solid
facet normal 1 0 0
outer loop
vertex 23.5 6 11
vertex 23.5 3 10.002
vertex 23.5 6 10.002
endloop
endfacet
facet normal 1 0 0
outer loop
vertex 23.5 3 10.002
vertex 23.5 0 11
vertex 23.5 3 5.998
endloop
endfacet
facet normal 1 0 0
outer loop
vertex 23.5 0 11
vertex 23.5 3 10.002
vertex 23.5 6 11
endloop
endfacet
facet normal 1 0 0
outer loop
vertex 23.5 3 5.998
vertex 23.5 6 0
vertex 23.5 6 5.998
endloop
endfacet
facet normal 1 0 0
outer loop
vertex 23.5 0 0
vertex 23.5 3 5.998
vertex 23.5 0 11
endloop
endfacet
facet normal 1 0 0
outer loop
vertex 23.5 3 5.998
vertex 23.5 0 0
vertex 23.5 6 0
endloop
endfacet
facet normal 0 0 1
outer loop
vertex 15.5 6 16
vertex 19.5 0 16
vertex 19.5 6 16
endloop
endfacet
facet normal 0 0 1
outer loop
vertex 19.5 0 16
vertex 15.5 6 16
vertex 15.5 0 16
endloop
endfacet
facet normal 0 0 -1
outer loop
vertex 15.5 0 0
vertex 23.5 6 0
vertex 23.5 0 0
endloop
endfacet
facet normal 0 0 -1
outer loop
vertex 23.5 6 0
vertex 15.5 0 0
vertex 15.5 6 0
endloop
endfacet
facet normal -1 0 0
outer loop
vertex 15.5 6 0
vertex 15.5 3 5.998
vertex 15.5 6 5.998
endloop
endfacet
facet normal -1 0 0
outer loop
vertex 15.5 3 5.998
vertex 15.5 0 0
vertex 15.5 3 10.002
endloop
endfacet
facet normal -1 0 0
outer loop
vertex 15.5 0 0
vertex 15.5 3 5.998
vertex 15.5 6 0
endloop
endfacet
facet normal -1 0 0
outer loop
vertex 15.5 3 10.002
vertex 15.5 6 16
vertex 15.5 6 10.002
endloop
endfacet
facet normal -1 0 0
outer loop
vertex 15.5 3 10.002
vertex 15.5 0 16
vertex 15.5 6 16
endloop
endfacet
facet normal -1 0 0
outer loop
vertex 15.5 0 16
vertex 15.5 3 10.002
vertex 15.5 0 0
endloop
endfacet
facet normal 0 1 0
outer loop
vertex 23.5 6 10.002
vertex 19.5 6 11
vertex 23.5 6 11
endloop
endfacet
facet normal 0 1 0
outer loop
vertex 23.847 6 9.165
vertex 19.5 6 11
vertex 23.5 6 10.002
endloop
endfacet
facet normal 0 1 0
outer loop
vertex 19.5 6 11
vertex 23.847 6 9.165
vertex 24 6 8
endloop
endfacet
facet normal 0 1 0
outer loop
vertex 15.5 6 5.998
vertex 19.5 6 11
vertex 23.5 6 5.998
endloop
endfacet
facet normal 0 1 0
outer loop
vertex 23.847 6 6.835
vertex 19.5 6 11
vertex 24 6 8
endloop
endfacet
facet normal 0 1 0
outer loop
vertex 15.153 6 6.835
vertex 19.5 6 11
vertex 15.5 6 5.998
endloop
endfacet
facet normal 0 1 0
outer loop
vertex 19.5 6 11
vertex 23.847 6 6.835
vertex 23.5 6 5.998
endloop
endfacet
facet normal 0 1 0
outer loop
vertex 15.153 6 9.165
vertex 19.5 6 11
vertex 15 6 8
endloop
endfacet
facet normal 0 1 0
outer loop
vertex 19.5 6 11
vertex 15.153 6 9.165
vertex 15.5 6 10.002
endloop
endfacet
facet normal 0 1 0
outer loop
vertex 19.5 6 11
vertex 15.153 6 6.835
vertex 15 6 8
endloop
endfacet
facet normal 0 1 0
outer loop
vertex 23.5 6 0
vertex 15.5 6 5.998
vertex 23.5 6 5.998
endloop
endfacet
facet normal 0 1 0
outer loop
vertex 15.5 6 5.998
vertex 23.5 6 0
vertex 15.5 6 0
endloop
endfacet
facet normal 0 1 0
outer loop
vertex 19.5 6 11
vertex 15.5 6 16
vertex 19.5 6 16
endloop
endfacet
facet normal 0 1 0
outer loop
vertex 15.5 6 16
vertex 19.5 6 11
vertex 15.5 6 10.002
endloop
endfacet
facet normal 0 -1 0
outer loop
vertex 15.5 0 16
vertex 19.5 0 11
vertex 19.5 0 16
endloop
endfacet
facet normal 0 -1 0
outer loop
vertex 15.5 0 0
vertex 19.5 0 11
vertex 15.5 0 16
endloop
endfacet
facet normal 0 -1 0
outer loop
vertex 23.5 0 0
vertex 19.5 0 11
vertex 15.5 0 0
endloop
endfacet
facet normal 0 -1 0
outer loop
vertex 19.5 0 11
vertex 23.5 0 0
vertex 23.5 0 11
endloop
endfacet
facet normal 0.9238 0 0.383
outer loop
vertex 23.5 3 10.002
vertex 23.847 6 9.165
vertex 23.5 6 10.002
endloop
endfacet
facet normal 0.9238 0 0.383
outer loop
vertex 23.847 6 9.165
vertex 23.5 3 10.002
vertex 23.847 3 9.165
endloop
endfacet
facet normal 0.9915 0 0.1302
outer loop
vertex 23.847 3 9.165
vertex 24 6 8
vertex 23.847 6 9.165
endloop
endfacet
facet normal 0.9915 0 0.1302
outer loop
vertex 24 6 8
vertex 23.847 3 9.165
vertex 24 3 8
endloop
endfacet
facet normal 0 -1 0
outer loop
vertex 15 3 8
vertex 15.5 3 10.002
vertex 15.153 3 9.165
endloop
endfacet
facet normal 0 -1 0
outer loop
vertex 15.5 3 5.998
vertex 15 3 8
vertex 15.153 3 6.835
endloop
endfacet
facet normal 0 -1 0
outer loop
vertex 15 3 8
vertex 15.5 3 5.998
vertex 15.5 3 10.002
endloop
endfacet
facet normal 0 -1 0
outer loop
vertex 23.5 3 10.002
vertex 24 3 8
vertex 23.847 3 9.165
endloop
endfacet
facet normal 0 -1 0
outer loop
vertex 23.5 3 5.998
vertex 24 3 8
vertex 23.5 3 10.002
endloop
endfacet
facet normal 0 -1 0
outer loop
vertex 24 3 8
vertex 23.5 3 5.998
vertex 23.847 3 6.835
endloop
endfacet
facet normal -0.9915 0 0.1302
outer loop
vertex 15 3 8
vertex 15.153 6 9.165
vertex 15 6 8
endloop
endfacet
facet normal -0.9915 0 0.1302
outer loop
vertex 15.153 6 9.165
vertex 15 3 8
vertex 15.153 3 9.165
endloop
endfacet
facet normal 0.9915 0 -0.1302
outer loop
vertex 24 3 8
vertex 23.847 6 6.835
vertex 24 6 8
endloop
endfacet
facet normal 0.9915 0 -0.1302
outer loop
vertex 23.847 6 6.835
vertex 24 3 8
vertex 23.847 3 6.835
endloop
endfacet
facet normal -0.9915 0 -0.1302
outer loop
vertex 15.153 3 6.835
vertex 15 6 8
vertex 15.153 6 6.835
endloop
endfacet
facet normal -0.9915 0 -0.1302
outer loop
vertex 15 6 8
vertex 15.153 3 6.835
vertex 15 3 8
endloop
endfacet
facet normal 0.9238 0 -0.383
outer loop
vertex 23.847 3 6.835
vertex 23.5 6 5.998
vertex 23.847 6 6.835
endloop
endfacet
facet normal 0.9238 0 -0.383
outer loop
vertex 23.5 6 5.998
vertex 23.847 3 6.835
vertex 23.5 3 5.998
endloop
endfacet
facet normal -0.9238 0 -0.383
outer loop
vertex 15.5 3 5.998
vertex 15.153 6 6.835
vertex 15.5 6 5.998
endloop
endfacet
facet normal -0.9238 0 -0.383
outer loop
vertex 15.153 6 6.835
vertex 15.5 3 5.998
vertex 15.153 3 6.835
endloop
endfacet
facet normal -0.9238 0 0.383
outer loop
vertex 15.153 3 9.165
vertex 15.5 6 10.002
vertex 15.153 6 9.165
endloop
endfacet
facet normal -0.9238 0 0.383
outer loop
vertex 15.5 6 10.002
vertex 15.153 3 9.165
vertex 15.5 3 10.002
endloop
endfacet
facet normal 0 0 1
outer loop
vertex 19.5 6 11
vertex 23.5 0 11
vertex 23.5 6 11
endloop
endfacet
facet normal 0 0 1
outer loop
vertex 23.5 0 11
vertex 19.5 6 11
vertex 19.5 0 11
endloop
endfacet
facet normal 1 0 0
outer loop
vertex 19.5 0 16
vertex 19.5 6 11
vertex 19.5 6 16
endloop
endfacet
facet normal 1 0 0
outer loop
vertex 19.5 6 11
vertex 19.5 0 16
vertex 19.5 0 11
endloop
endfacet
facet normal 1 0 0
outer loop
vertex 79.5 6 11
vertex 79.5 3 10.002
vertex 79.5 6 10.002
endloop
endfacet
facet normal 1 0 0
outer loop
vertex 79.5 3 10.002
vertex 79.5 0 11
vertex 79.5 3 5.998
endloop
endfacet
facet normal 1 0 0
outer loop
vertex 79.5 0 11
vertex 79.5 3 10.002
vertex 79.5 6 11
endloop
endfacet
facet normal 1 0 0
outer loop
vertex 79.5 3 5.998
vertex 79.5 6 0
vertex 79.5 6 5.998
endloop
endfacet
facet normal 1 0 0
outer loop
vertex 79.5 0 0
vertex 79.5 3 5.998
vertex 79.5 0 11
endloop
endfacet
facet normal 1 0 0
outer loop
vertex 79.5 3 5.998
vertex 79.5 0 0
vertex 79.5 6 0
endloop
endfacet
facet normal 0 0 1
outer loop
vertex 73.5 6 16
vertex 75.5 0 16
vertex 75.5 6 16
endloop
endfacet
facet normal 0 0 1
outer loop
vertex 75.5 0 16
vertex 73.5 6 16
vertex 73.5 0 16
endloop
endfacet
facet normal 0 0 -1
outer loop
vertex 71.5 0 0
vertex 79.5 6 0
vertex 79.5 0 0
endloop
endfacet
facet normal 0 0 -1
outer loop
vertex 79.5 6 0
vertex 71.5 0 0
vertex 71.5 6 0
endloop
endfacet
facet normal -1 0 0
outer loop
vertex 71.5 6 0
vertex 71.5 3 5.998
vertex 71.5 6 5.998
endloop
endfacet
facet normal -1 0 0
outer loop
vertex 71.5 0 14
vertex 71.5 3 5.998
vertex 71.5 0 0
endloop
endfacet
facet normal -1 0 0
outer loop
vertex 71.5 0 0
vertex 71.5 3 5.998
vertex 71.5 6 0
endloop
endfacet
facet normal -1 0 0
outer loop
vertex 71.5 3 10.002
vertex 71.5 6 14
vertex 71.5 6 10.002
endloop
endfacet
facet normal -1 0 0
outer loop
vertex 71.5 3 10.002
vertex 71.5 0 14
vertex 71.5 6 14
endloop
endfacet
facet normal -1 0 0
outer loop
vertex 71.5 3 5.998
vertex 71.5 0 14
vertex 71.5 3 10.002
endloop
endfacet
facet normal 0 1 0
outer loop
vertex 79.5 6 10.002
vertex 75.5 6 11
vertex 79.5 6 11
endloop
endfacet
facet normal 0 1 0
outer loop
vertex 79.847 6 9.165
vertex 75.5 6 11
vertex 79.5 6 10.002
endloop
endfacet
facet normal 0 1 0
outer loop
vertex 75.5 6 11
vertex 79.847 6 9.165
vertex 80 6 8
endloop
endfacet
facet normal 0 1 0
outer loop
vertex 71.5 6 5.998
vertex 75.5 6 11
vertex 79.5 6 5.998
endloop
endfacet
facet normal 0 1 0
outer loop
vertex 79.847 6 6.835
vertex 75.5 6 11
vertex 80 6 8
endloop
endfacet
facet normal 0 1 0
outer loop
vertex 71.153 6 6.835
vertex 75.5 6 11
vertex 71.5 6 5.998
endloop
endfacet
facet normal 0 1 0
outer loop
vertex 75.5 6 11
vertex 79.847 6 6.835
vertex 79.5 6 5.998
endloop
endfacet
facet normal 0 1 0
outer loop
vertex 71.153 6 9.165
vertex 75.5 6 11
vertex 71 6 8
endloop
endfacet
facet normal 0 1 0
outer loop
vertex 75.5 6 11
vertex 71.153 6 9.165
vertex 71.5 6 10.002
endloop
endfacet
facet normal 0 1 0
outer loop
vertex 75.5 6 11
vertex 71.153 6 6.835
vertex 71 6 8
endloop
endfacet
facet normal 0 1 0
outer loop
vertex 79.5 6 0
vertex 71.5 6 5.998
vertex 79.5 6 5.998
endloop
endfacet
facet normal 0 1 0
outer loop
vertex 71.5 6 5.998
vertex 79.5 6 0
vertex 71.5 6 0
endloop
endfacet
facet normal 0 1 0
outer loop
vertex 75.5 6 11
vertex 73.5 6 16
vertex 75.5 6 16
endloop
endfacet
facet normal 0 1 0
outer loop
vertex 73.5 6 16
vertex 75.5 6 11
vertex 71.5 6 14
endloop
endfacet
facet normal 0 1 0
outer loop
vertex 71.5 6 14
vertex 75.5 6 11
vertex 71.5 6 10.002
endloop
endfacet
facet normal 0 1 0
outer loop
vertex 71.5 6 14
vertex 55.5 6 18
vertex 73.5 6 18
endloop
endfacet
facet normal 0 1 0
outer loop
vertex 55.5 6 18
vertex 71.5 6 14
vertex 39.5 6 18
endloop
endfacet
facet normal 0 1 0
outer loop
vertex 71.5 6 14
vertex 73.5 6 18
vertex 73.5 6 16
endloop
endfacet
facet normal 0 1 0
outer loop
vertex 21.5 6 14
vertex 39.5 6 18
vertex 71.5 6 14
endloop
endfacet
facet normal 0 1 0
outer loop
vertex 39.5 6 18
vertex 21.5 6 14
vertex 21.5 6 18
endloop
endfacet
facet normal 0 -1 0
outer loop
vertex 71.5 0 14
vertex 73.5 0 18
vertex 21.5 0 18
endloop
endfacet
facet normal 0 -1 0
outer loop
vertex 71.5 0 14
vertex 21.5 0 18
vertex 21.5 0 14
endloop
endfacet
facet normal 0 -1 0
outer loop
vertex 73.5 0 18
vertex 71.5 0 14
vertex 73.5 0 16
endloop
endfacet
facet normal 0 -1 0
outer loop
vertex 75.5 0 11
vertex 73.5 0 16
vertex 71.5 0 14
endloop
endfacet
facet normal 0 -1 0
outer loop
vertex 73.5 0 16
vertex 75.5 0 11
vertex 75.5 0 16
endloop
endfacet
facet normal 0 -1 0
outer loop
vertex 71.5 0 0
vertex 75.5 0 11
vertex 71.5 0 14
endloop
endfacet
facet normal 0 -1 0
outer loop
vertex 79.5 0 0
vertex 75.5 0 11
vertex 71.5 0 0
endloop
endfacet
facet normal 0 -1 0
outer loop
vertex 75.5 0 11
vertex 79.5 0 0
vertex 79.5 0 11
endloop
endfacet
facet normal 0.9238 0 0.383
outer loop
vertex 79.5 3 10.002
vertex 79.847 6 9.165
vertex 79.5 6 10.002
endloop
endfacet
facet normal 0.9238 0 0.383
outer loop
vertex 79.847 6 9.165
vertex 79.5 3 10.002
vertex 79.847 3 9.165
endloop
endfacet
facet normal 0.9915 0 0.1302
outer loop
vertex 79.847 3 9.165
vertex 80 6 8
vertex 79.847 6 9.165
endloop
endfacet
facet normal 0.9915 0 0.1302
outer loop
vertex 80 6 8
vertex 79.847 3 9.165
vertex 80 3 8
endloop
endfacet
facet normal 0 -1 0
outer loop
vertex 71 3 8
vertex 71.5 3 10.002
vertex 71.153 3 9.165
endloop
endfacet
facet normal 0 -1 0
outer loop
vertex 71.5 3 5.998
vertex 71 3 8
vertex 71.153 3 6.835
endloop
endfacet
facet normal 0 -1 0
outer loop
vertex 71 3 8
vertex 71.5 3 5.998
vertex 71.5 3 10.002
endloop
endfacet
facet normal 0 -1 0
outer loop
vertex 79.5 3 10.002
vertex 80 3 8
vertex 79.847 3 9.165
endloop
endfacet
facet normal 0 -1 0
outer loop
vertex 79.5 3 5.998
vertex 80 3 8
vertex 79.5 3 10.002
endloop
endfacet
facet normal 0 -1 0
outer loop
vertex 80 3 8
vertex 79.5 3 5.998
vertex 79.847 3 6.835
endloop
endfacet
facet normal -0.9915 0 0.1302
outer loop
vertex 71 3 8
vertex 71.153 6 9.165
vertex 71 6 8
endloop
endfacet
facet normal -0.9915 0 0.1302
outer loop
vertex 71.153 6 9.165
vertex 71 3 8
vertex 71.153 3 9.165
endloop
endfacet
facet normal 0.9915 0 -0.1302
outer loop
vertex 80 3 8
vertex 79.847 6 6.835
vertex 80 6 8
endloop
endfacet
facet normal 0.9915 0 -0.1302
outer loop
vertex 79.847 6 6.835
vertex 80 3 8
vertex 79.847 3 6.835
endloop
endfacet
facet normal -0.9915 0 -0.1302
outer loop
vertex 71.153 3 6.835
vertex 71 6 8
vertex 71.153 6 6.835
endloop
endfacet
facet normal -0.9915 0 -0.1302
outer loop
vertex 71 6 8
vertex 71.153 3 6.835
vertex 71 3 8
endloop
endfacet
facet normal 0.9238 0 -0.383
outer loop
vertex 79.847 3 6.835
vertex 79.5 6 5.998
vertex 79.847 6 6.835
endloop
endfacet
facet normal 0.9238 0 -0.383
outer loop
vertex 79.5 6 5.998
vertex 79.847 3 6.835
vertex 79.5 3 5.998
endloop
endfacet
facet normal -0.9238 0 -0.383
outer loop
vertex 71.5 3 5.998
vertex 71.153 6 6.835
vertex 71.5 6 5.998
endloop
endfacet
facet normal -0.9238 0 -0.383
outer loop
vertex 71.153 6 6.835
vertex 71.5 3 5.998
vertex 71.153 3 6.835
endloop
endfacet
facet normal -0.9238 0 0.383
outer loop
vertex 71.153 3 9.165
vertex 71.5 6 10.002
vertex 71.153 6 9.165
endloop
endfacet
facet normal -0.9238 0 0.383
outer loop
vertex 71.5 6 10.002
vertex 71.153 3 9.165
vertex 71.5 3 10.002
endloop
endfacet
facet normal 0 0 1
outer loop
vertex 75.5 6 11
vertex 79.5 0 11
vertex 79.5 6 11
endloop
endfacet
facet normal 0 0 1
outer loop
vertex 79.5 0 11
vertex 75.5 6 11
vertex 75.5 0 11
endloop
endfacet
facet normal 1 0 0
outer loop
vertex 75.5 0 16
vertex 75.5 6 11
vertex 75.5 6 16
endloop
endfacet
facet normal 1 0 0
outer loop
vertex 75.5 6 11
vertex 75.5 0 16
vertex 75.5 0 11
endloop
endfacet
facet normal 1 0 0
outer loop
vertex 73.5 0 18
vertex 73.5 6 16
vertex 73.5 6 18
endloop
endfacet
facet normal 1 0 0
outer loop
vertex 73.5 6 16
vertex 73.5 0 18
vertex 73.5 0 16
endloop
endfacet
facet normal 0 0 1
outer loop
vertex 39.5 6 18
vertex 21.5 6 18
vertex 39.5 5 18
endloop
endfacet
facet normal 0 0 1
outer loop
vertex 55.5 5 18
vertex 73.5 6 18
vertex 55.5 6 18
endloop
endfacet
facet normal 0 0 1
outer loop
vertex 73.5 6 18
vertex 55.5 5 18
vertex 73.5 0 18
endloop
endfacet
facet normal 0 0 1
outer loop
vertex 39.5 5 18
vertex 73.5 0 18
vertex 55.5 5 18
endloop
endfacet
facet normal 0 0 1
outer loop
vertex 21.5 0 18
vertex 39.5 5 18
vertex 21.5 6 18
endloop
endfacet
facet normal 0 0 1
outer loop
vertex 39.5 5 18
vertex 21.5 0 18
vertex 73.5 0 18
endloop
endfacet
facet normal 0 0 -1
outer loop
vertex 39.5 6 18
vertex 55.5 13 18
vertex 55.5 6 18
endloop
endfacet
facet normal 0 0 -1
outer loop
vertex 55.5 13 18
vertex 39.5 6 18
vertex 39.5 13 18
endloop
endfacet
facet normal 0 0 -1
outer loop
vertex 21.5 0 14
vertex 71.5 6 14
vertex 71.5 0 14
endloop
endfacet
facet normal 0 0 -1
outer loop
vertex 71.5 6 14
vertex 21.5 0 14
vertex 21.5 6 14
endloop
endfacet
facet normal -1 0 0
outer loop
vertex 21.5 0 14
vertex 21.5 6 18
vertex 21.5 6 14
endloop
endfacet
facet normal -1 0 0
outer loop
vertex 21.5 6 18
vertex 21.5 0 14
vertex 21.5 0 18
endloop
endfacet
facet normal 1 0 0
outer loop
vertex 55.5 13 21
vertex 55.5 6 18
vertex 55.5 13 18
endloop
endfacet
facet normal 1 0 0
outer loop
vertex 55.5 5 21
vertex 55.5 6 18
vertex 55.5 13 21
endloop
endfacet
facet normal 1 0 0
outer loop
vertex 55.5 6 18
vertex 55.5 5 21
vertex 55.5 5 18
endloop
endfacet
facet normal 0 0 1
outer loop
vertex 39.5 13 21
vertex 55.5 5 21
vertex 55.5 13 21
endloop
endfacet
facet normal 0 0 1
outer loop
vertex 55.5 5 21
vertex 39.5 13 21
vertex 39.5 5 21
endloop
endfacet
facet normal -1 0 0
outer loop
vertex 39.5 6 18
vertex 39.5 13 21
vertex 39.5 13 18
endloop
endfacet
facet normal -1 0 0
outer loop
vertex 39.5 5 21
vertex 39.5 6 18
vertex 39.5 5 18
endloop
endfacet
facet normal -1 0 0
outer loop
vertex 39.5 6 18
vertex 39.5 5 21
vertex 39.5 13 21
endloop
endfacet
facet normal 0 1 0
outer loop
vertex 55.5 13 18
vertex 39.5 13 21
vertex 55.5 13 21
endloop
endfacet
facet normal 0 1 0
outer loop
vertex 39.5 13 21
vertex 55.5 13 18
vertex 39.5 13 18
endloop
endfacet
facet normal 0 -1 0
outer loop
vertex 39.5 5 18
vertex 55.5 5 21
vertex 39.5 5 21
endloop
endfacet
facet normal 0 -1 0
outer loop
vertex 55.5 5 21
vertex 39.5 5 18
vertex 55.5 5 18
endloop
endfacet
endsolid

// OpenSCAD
// file: ctg_params.scad
// Shared parameters — CyberThreatGotchi Tamagotchi enclosure (mm)

// Outer envelope
width  = 95;
height = 110;
depth  = 32;
wall   = 2.0;
corner_r = 4;

// Display (Waveshare 2.13" default)
display_cut_w = 50;
display_cut_h = 26;
display_z     = 72;
bezel_lip     = 2.5;

// Ports
usbc_w = 12;
usbc_h = 6;
reset_r = 3;

// BPI-R3 Mini standoffs (verify against your board revision)
standoff_h    = 6;
standoff_od   = 4.5;
standoff_hole = 1.25;  // M2.5 pilot
standoff_positions = [[12, 45], [53, 45], [12, 78], [53, 78]];

// Cat emboss positions [x, z]
cat_bump_r = 4;
cat_positions = [[10, 88], [78, 88], [10, 28], [78, 28]];

// SPI ribbon channel (left inner wall)
ribbon_w = 8;
ribbon_d = 20;

// Rear vents
vent_count = 4;
vent_w     = 15;
vent_h     = 3;
vent_gap   = 4;

// Ethernet grommet holes (rear face)
eth_grommet_r = 4;
eth_x_positions = [24, width - 24];

// Battery tray
battery_lip     = 3;
battery_shelf_z = 18;

// Clip slots in rear shell
clip_slot_x = 6;
clip_slot_w = 10;
clip_slot_h = 14;
clip_slot_d = 2.5;

// Snap clip dimensions
clip_bar_w  = 52;
clip_arm_w  = 8;
clip_arm_h  = 16;
clip_depth  = 6;
clip_hook_h = 5;

module rounded_box(w, d, h, r) {
  hull() {
    for (dx = [r, w - r])
      for (dy = [r, d - r])
        for (dz = [r, h - r])
          translate([dx, dy, dz])
          sphere(r = r, $fn = 16);
  }
}

module standoff_post(h, od, hole) {
  difference() {
    cylinder(h = h, r = od / 2, $fn = 24);
    translate([0, 0, -0.1])
      cylinder(h = h + 1, r = hole, $fn = 16);
  }
}
// main file
// CyberThreatGotchi — SNAP CLIP (joins front + rear shells)
// Export: openscad -o ctg_clip.stl ctg_clip.scad

include <ctg_params.scad>

module clip_arm(offset_x) {
  translate([offset_x, 0, 0])
    difference() {
      union() {
        cube([clip_arm_w, clip_depth, clip_arm_h]);
        translate([clip_arm_w / 2, clip_depth, clip_arm_h / 2])
          rotate([90, 0, 0])
          cylinder(h = 3, r = clip_arm_w / 2 + 0.5, $fn = 24);
      }
      translate([clip_arm_w / 2, -0.1, clip_arm_h - clip_hook_h])
        rotate([0, 0, 0])
        cube([clip_arm_w - 2, clip_depth + 2, clip_hook_h + 2], center = false);
    }
}

module snap_clip() {
  union() {
    // Crossbar
    translate([(width - clip_bar_w) / 2, 0, clip_arm_h - 2])
      cube([clip_bar_w, clip_depth, 4]);
    clip_arm((width - clip_bar_w) / 2 - clip_arm_w + 2);
    clip_arm((width + clip_bar_w) / 2 - 2);
    // Finger pull tab
    translate([width / 2 - 8, clip_depth - 1, clip_arm_h + 2])
      cube([16, 8, 3]);
  }
}

snap_clip();
